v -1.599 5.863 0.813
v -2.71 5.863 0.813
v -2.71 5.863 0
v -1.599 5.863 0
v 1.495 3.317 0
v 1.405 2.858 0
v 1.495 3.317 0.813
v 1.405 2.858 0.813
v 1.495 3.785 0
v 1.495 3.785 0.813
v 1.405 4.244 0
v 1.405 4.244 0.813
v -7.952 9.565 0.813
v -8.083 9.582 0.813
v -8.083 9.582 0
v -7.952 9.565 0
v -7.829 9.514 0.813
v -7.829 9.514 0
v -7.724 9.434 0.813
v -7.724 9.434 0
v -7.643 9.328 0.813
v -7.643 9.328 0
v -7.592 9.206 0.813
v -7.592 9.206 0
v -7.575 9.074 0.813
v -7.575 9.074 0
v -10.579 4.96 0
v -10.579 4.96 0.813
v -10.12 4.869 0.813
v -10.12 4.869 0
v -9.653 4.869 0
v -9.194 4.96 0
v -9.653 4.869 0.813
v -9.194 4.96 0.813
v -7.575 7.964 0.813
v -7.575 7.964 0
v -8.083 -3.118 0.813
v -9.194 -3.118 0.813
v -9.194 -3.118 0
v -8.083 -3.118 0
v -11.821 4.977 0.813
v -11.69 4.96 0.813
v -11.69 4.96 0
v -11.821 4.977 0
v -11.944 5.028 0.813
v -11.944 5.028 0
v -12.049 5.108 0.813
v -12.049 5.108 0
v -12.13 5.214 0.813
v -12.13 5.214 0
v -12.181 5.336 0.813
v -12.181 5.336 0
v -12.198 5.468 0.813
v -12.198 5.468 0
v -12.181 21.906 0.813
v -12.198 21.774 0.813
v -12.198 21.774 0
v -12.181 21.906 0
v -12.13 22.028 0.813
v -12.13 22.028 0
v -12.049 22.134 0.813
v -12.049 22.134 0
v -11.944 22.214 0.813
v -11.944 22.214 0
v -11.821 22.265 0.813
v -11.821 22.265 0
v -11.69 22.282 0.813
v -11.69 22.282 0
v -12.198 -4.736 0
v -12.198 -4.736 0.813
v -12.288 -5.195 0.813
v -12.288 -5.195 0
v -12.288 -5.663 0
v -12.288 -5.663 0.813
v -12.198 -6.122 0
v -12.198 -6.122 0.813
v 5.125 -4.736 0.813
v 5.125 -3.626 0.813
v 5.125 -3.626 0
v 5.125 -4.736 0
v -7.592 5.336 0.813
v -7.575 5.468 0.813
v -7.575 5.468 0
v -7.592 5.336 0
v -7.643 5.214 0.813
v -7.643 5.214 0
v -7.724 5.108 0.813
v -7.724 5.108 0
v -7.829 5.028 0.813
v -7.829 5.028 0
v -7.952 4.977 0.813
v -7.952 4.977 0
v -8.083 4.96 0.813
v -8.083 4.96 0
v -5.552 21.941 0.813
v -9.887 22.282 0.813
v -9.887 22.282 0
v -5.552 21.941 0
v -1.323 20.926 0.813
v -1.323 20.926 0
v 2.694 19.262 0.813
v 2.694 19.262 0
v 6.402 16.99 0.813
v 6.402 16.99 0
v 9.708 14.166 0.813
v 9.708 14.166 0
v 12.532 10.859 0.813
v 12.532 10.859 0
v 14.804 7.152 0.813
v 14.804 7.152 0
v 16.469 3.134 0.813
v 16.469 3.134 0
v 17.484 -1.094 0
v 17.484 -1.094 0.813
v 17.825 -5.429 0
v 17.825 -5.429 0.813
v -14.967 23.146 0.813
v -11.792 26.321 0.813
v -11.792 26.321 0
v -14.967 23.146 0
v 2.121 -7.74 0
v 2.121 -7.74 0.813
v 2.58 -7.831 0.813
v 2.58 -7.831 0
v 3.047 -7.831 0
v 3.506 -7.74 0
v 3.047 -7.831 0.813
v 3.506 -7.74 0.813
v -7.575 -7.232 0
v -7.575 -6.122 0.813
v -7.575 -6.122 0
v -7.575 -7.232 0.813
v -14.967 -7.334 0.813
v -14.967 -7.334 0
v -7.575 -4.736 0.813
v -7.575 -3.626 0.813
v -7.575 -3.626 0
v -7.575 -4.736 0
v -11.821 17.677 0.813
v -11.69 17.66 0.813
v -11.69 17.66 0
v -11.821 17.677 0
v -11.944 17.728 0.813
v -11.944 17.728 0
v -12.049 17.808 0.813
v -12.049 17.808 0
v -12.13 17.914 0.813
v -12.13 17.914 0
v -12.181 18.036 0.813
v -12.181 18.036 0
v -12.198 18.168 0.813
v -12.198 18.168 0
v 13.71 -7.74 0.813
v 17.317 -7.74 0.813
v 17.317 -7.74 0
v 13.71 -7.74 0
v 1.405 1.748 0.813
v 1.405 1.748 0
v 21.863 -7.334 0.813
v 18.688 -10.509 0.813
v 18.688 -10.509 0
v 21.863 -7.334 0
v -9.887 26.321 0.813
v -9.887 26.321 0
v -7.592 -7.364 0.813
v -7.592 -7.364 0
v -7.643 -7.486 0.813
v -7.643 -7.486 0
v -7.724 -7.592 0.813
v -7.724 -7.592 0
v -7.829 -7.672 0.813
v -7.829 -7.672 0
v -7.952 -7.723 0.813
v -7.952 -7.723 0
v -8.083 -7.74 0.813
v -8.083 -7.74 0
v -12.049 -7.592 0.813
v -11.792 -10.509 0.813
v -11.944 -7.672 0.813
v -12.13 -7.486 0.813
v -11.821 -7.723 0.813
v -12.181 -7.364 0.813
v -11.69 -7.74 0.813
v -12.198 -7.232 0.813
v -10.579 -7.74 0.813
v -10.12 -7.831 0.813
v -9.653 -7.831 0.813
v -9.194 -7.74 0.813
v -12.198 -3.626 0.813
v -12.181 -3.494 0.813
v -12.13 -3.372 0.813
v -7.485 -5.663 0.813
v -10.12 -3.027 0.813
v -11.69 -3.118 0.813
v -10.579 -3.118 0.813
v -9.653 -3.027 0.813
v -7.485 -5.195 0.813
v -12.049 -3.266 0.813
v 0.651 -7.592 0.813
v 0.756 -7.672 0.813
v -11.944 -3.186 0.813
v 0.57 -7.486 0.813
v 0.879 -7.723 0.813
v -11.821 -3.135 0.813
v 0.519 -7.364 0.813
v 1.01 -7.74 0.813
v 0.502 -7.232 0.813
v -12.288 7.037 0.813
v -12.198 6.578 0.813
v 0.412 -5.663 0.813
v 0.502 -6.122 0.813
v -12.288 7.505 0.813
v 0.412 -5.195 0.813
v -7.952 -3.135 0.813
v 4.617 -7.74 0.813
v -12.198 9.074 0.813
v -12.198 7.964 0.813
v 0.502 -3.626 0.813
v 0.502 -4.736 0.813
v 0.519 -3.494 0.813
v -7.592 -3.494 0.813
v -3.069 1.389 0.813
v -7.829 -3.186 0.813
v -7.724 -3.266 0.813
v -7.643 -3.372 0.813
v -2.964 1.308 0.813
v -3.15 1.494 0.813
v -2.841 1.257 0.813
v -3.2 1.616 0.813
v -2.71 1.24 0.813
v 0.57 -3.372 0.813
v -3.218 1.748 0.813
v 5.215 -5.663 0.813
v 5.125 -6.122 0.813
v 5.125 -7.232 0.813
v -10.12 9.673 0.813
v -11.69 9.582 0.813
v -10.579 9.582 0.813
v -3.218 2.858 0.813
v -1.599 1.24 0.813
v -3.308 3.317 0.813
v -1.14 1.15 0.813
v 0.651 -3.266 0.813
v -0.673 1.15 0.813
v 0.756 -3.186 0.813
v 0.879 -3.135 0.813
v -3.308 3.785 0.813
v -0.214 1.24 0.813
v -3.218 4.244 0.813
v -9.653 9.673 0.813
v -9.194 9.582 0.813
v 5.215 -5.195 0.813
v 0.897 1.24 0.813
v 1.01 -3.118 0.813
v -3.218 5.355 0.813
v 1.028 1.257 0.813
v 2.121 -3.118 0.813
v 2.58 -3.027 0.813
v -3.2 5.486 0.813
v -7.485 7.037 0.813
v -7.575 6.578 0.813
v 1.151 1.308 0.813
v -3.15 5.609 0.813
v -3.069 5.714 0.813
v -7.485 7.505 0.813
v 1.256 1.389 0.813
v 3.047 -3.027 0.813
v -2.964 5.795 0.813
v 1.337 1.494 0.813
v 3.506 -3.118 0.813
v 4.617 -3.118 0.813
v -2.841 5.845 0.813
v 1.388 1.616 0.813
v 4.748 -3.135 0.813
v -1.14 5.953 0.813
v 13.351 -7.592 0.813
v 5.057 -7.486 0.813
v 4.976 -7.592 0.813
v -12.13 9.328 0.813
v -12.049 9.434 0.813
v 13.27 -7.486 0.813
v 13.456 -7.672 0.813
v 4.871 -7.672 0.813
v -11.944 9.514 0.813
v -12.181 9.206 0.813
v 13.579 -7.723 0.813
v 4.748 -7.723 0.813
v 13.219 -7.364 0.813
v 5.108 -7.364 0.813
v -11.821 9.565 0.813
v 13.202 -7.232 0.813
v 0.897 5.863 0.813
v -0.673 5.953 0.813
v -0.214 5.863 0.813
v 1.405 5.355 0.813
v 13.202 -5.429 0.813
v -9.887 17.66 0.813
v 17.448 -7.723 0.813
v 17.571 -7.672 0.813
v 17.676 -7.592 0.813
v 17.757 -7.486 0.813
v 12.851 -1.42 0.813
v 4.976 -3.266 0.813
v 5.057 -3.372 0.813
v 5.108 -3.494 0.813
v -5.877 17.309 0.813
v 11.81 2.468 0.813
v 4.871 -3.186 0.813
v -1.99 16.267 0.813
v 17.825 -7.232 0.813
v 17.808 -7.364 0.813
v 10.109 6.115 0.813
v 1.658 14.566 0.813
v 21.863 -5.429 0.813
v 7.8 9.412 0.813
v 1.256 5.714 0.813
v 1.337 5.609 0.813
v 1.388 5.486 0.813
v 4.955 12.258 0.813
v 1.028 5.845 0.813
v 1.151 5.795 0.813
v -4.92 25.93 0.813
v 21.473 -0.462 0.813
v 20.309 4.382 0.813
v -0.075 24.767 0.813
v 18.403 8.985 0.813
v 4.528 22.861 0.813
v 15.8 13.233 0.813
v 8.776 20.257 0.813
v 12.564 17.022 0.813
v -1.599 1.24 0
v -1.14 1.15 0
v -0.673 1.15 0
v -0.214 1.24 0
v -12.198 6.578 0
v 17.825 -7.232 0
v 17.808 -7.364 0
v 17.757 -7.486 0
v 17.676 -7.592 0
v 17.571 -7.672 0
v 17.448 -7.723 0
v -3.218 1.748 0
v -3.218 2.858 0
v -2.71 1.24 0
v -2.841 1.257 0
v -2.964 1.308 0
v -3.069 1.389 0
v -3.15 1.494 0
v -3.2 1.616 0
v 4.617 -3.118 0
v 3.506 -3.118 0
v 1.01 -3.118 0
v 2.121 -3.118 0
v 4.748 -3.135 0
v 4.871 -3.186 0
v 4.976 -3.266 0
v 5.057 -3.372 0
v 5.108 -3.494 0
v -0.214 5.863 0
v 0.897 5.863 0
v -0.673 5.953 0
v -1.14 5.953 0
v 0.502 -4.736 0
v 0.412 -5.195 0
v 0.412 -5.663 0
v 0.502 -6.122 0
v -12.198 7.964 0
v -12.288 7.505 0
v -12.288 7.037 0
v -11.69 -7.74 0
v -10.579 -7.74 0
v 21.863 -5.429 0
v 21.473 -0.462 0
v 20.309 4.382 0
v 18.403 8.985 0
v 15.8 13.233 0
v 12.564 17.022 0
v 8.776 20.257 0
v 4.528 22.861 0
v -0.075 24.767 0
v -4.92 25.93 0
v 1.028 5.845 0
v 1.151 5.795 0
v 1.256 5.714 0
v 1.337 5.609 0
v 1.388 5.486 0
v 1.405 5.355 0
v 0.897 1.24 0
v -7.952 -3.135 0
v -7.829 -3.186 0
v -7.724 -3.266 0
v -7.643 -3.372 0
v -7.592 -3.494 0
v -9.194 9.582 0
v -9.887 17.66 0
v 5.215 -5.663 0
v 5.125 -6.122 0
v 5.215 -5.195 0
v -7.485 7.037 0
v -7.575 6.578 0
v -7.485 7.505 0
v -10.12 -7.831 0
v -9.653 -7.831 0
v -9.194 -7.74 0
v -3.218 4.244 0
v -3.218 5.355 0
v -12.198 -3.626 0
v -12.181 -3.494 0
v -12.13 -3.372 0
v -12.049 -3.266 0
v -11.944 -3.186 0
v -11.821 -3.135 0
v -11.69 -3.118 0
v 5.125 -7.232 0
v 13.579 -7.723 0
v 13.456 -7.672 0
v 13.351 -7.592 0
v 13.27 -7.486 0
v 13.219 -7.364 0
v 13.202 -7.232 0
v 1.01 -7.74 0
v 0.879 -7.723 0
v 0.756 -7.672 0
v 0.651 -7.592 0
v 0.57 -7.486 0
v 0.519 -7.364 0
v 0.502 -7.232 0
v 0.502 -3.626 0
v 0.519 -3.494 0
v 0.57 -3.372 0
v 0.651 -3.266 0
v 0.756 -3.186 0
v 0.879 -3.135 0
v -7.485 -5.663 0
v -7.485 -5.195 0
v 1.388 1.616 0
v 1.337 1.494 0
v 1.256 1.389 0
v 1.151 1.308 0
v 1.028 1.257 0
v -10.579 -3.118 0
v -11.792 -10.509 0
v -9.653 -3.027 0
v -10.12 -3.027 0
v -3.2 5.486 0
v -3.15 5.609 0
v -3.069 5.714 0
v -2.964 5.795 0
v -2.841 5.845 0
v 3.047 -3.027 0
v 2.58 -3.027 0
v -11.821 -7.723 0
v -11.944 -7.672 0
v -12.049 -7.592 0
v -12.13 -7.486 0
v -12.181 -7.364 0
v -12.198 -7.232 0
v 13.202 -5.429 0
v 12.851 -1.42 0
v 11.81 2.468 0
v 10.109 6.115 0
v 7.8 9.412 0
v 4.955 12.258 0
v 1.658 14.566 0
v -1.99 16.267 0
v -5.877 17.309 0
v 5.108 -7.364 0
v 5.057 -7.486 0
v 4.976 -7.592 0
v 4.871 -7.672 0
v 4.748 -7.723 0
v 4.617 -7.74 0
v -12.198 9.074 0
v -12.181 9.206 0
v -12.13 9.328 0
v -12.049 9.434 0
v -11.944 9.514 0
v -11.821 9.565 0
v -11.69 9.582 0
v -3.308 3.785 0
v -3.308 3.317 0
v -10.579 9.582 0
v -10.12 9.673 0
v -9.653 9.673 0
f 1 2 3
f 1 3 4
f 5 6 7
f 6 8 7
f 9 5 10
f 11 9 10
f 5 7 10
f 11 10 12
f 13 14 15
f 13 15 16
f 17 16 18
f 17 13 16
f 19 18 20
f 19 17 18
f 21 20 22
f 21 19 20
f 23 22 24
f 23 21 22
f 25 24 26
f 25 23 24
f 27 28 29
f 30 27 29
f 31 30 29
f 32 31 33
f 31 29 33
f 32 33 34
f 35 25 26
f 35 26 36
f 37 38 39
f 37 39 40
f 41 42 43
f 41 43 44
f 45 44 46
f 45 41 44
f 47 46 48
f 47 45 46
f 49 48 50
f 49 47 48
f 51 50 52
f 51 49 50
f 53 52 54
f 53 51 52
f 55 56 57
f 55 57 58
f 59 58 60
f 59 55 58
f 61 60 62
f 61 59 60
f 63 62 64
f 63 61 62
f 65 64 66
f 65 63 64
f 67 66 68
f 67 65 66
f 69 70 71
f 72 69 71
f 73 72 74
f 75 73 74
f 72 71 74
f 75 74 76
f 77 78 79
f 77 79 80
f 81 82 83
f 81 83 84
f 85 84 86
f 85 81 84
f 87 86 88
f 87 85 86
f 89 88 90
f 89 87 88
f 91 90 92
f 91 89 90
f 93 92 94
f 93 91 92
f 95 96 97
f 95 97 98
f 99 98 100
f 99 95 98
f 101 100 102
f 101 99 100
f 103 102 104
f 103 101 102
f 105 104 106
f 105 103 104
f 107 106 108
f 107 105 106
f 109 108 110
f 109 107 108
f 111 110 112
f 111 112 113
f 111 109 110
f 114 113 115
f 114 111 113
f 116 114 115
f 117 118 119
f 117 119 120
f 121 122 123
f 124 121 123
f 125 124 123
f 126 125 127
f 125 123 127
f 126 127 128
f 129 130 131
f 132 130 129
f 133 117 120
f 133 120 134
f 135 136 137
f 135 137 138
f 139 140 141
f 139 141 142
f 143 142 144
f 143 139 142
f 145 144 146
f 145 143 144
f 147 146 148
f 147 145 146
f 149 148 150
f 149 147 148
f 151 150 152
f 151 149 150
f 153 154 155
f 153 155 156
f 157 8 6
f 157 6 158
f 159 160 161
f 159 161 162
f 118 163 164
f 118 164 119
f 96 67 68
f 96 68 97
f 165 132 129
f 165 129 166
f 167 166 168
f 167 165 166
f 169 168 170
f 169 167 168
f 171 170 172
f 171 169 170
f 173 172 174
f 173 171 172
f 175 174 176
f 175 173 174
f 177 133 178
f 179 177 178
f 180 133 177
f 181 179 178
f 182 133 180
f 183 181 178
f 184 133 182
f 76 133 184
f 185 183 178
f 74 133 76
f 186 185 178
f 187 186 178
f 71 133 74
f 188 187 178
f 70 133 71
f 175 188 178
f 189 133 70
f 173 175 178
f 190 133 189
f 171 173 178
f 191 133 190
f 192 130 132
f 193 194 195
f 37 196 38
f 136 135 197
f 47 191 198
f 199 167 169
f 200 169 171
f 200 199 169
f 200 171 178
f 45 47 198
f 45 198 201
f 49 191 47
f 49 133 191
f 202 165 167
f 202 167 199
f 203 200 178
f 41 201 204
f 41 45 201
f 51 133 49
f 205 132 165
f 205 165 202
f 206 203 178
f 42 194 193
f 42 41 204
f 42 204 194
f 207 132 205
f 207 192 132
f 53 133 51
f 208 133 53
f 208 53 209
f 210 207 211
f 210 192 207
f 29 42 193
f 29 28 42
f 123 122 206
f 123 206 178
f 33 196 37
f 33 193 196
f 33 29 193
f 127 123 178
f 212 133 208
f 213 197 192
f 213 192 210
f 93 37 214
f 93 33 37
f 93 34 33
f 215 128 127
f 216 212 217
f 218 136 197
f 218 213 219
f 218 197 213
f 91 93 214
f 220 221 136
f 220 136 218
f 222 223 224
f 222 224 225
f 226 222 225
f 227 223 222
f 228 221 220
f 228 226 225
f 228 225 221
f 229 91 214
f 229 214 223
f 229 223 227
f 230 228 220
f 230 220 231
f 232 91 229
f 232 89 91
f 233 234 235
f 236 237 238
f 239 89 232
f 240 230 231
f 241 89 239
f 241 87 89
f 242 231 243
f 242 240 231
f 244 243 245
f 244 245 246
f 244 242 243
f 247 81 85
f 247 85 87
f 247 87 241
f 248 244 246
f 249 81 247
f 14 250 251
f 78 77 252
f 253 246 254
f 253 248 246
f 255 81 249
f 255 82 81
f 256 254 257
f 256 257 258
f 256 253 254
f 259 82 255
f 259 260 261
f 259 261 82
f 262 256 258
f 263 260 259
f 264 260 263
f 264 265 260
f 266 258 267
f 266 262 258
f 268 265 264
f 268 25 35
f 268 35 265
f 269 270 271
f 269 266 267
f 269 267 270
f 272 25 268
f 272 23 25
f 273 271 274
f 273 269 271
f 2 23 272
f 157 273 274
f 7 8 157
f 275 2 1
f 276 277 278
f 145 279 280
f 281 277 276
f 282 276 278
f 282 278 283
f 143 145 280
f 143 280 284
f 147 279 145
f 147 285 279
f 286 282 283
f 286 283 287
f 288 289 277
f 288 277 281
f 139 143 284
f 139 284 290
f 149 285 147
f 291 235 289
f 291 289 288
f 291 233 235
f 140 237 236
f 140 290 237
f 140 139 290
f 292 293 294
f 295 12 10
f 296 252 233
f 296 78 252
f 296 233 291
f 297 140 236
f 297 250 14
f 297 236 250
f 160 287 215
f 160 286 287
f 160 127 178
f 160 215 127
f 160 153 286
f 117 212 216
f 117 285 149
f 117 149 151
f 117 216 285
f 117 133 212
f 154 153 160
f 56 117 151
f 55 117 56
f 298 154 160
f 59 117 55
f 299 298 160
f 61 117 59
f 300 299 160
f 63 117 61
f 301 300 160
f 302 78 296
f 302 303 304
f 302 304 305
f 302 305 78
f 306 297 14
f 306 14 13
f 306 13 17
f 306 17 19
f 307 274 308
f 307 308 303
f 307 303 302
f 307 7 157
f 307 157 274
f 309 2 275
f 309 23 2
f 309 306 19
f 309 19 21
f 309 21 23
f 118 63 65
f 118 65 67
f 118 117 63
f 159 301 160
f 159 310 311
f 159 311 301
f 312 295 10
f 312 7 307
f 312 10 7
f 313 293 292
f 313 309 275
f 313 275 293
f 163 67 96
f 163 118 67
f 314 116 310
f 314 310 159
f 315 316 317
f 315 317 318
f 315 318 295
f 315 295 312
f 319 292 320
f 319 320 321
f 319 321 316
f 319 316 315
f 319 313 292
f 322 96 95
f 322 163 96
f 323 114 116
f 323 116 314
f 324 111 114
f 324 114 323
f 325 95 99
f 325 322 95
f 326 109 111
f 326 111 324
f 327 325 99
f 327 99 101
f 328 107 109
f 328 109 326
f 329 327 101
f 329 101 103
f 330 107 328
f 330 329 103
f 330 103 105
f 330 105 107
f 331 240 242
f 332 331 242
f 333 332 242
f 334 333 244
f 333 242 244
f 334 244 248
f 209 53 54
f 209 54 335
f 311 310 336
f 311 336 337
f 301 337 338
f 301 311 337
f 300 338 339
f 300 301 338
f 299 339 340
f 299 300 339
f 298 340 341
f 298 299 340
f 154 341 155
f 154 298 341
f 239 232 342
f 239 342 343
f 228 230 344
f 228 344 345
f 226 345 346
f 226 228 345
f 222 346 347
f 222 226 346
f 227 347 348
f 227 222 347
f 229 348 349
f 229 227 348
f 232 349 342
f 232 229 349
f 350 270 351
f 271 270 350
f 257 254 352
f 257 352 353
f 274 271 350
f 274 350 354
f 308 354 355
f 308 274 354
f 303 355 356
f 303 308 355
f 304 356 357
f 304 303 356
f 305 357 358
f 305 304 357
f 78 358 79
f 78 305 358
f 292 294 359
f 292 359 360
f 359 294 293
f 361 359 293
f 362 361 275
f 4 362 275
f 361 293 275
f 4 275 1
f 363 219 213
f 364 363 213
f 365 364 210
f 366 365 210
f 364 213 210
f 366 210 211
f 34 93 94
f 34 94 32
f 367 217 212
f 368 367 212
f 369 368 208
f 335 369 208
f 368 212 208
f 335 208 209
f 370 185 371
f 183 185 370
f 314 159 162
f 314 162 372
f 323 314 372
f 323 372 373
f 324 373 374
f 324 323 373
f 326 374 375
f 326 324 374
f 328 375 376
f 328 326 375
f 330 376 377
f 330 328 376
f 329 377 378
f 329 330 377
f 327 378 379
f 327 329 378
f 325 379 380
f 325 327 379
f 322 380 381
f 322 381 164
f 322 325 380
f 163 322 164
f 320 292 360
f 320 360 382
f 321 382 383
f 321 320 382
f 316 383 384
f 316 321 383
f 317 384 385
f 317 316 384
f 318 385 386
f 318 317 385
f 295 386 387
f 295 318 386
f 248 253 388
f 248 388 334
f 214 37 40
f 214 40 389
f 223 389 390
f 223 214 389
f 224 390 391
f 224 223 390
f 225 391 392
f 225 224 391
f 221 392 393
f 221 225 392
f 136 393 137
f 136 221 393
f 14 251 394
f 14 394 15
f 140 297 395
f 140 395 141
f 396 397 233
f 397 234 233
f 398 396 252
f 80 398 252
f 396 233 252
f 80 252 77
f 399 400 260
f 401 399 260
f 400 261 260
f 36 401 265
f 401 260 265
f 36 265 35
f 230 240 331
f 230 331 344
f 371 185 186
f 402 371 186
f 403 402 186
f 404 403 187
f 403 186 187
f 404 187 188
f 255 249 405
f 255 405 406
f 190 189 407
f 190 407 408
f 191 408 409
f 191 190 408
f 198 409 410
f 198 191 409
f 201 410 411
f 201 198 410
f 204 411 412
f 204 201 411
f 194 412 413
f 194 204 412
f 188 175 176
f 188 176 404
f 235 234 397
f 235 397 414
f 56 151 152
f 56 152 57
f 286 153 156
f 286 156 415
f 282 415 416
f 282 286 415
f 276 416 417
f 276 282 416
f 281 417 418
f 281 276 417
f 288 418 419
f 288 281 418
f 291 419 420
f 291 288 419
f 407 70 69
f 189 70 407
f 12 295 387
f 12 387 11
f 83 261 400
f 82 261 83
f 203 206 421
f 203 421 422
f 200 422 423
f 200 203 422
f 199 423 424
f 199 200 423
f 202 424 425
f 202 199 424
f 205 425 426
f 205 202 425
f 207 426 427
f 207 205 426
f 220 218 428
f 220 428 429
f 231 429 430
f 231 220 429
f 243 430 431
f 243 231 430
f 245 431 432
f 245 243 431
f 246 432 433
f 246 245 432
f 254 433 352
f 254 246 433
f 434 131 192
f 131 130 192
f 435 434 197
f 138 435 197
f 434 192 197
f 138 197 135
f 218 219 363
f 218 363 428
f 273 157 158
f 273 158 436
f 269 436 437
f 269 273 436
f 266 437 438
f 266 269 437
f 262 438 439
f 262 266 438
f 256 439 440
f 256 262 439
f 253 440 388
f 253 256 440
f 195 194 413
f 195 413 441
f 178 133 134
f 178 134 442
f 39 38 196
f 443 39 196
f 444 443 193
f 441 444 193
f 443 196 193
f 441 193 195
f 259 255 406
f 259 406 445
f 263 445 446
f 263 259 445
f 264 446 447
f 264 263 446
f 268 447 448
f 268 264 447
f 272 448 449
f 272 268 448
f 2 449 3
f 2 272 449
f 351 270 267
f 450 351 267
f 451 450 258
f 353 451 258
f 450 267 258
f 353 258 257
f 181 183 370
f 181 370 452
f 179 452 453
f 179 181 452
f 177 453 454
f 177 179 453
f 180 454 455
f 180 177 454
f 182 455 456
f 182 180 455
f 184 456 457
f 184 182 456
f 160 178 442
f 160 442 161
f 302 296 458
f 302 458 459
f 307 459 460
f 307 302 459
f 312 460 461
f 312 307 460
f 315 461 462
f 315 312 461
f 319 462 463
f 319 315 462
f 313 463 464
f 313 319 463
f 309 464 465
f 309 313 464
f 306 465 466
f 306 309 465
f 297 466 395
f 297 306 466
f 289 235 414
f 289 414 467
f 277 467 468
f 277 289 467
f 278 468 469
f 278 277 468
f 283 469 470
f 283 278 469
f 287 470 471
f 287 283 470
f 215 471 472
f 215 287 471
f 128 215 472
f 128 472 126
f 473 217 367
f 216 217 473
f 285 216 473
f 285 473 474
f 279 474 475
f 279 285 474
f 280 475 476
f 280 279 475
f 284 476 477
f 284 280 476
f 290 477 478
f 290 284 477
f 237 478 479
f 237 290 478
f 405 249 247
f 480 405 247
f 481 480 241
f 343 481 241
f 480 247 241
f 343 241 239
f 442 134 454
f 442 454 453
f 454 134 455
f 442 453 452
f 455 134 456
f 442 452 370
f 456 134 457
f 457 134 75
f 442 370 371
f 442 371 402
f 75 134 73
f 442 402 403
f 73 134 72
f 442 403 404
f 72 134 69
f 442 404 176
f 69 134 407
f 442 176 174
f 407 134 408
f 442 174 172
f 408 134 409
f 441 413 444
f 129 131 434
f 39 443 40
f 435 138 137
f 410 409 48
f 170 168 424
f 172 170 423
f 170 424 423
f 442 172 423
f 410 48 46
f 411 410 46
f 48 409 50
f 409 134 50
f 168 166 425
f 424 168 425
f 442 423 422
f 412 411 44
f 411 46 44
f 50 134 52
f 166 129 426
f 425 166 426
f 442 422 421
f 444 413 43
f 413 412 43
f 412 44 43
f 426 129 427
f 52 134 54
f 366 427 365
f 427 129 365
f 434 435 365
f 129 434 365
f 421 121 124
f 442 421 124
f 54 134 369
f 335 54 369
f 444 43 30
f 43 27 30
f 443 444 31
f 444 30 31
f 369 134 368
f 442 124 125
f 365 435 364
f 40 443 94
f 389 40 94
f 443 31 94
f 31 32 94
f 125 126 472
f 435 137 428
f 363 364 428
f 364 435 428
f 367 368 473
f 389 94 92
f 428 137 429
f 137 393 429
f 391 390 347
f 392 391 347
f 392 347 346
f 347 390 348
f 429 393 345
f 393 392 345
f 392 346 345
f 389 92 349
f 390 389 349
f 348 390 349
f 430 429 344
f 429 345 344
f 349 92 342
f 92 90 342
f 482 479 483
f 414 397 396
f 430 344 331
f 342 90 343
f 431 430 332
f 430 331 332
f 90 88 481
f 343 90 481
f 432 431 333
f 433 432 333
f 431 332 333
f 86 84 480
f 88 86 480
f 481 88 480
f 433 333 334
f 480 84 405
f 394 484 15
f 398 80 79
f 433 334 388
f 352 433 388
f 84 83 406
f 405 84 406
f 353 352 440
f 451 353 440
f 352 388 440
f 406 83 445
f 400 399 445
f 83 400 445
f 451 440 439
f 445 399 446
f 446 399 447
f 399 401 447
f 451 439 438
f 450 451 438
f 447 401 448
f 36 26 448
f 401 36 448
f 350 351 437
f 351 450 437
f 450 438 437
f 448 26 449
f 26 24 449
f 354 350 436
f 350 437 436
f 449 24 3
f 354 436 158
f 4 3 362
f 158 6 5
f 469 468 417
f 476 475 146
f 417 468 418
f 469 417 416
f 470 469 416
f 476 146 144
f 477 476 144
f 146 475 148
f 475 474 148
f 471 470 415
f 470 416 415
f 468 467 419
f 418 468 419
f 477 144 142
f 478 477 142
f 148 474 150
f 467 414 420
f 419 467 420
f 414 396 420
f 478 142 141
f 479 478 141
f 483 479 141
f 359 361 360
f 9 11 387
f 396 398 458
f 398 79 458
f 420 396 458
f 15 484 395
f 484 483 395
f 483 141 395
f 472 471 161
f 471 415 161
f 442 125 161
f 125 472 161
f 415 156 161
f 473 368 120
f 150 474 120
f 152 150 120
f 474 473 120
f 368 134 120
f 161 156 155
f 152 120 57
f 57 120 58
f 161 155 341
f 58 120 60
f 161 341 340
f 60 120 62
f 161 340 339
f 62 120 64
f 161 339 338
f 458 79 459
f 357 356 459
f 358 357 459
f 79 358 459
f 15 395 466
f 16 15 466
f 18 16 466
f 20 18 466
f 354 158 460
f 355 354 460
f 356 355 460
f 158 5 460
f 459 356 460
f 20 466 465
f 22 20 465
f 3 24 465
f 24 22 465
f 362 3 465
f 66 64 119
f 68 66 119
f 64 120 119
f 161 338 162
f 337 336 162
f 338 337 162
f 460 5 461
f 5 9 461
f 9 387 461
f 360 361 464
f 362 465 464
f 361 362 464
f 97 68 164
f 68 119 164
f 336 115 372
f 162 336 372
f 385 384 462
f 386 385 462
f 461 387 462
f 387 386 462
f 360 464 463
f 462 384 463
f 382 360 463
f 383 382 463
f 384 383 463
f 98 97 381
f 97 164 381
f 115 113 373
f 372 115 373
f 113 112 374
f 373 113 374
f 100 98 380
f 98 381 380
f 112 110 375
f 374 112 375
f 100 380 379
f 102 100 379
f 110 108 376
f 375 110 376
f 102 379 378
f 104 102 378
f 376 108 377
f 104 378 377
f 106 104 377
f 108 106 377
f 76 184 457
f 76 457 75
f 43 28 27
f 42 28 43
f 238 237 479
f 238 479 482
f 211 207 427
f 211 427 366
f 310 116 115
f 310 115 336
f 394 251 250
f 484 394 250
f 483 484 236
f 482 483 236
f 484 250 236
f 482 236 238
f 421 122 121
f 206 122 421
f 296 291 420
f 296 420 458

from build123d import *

# Parameters (mm, degrees)
BOSS_EXTRUDE1_DEPTH = 0.8128
SKETCH2_R           = 2.413
CUT_EXTRUDE1_DEPTH  = 2.54


with BuildPart() as part:
    # Sketch1 → Boss-Extrude1 (new body)
    with BuildSketch(Plane.XY.offset(0.8128)):
        with BuildLine():
            Line((-14.966560113, 23.146095061), (-14.966560113, -7.333904636))
            Line((-14.966560113, -7.333904636), (-11.791560113, -10.508904636))
            Line((-11.791560113, -10.508904636), (18.688439584, -10.508904636))
            Line((18.688439584, -10.508904636), (21.863439584, -7.333904636))
            Line((21.863439584, -7.333904636), (21.863439584, -5.428904939))
            ThreePointArc((21.863439584, -5.428904939), (12.564079886, 17.021735364), (-9.886560416, 26.321095061))
            Line((-9.886560416, 26.321095061), (-11.791560113, 26.321095061))
            Line((-11.791560113, 26.321095061), (-14.966560113, 23.146095061))
        make_face()
        with BuildLine():
            Line((17.316839733, -7.740304939), (13.710039804, -7.740304939))
            ThreePointArc((13.710039804, -7.740304939), (13.350829567, -7.591515187), (13.202039815, -7.23230495))
            Line((13.202039815, -7.23230495), (13.202039815, -5.428904939))
            ThreePointArc((13.202039815, -5.428904939), (6.439545376, 10.897200853), (-9.886560416, 17.659695293))
            Line((-9.886560416, 17.659695293), (-11.689960428, 17.659695293))
            ThreePointArc((-11.689960428, 17.659695293), (-12.049170664, 17.808485045), (-12.197960416, 18.167695282))
            Line((-12.197960416, 18.167695282), (-12.197960416, 21.77449521))
            ThreePointArc((-12.197960416, 21.77449521), (-12.049170664, 22.133705447), (-11.689960428, 22.282495199))
            Line((-11.689960428, 22.282495199), (-9.886560416, 22.282495199))
            ThreePointArc((-9.886560416, 22.282495199), (9.708358537, 14.166014015), (17.824839722, -5.428904939))
            Line((17.824839722, -5.428904939), (17.824839722, -7.23230495))
            ThreePointArc((17.824839722, -7.23230495), (17.67604997, -7.591515187), (17.316839733, -7.740304939))
        make_face(mode=Mode.SUBTRACT)
        with BuildLine():
            Line((5.124839584, -3.625504927), (5.124839584, -7.23230495))
            ThreePointArc((5.124839584, -7.23230495), (4.976049832, -7.591515187), (4.616839595, -7.740304939))
            Line((4.616839595, -7.740304939), (1.010039572, -7.740304939))
            ThreePointArc((1.010039572, -7.740304939), (0.650829336, -7.591515187), (0.502039584, -7.23230495))
            Line((0.502039584, -7.23230495), (0.502039584, -3.625504927))
            ThreePointArc((0.502039584, -3.625504927), (0.650829336, -3.266294691), (1.010039572, -3.117504939))
            Line((1.010039572, -3.117504939), (4.616839595, -3.117504939))
            ThreePointArc((4.616839595, -3.117504939), (4.976049832, -3.266294691), (5.124839584, -3.625504927))
        make_face(mode=Mode.SUBTRACT)
        with BuildLine():
            Line((-2.709790428, 5.862665061), (0.897009595, 5.862665061))
            ThreePointArc((0.897009595, 5.862665061), (1.256219832, 5.713875309), (1.405009584, 5.354665073))
            Line((1.405009584, 5.354665073), (1.405009584, 1.74786505))
            ThreePointArc((1.405009584, 1.74786505), (1.256219832, 1.388654813), (0.897009595, 1.239865061))
            Line((0.897009595, 1.239865061), (-2.709790428, 1.239865061))
            ThreePointArc((-2.709790428, 1.239865061), (-3.069000664, 1.388654813), (-3.217790416, 1.74786505))
            Line((-3.217790416, 1.74786505), (-3.217790416, 5.354665073))
            ThreePointArc((-3.217790416, 5.354665073), (-3.069000664, 5.713875309), (-2.709790428, 5.862665061))
        make_face(mode=Mode.SUBTRACT)
        with BuildLine():
            Line((-11.689960428, 9.582495061), (-8.083160405, 9.582495061))
            ThreePointArc((-8.083160405, 9.582495061), (-7.723950168, 9.433705309), (-7.575160416, 9.074495073))
            Line((-7.575160416, 9.074495073), (-7.575160416, 5.46769505))
            ThreePointArc((-7.575160416, 5.46769505), (-7.723950168, 5.108484813), (-8.083160405, 4.959695061))
            Line((-8.083160405, 4.959695061), (-11.689960428, 4.959695061))
            ThreePointArc((-11.689960428, 4.959695061), (-12.049170664, 5.108484813), (-12.197960416, 5.46769505))
            Line((-12.197960416, 5.46769505), (-12.197960416, 9.074495073))
            ThreePointArc((-12.197960416, 9.074495073), (-12.049170664, 9.433705309), (-11.689960428, 9.582495061))
        make_face(mode=Mode.SUBTRACT)
        with BuildLine():
            Line((-8.083160405, -7.740304939), (-11.689960428, -7.740304939))
            ThreePointArc((-11.689960428, -7.740304939), (-12.049170664, -7.591515187), (-12.197960416, -7.23230495))
            Line((-12.197960416, -7.23230495), (-12.197960416, -3.625504927))
            ThreePointArc((-12.197960416, -3.625504927), (-12.049170664, -3.266294691), (-11.689960428, -3.117504939))
            Line((-11.689960428, -3.117504939), (-8.083160405, -3.117504939))
            ThreePointArc((-8.083160405, -3.117504939), (-7.723950168, -3.266294691), (-7.575160416, -3.625504927))
            Line((-7.575160416, -3.625504927), (-7.575160416, -7.23230495))
            ThreePointArc((-7.575160416, -7.23230495), (-7.723950168, -7.591515187), (-8.083160405, -7.740304939))
        make_face(mode=Mode.SUBTRACT)
    extrude(amount=-BOSS_EXTRUDE1_DEPTH)

    # Sketch2 → Cut-Extrude1 (cut)
    with BuildSketch(Plane.XY.offset(0.8128)):
        with Locations((-9.886560416, 7.271095061)):
            Circle(SKETCH2_R)
        with Locations((-0.906390416, 3.551265061)):
            Circle(SKETCH2_R)
        with Locations((2.813439584, -5.428904939)):
            Circle(SKETCH2_R)
        with Locations((-9.886560416, -5.428904939)):
            Circle(SKETCH2_R)
    extrude(amount=-CUT_EXTRUDE1_DEPTH, mode=Mode.SUBTRACT)


solid = part.part
